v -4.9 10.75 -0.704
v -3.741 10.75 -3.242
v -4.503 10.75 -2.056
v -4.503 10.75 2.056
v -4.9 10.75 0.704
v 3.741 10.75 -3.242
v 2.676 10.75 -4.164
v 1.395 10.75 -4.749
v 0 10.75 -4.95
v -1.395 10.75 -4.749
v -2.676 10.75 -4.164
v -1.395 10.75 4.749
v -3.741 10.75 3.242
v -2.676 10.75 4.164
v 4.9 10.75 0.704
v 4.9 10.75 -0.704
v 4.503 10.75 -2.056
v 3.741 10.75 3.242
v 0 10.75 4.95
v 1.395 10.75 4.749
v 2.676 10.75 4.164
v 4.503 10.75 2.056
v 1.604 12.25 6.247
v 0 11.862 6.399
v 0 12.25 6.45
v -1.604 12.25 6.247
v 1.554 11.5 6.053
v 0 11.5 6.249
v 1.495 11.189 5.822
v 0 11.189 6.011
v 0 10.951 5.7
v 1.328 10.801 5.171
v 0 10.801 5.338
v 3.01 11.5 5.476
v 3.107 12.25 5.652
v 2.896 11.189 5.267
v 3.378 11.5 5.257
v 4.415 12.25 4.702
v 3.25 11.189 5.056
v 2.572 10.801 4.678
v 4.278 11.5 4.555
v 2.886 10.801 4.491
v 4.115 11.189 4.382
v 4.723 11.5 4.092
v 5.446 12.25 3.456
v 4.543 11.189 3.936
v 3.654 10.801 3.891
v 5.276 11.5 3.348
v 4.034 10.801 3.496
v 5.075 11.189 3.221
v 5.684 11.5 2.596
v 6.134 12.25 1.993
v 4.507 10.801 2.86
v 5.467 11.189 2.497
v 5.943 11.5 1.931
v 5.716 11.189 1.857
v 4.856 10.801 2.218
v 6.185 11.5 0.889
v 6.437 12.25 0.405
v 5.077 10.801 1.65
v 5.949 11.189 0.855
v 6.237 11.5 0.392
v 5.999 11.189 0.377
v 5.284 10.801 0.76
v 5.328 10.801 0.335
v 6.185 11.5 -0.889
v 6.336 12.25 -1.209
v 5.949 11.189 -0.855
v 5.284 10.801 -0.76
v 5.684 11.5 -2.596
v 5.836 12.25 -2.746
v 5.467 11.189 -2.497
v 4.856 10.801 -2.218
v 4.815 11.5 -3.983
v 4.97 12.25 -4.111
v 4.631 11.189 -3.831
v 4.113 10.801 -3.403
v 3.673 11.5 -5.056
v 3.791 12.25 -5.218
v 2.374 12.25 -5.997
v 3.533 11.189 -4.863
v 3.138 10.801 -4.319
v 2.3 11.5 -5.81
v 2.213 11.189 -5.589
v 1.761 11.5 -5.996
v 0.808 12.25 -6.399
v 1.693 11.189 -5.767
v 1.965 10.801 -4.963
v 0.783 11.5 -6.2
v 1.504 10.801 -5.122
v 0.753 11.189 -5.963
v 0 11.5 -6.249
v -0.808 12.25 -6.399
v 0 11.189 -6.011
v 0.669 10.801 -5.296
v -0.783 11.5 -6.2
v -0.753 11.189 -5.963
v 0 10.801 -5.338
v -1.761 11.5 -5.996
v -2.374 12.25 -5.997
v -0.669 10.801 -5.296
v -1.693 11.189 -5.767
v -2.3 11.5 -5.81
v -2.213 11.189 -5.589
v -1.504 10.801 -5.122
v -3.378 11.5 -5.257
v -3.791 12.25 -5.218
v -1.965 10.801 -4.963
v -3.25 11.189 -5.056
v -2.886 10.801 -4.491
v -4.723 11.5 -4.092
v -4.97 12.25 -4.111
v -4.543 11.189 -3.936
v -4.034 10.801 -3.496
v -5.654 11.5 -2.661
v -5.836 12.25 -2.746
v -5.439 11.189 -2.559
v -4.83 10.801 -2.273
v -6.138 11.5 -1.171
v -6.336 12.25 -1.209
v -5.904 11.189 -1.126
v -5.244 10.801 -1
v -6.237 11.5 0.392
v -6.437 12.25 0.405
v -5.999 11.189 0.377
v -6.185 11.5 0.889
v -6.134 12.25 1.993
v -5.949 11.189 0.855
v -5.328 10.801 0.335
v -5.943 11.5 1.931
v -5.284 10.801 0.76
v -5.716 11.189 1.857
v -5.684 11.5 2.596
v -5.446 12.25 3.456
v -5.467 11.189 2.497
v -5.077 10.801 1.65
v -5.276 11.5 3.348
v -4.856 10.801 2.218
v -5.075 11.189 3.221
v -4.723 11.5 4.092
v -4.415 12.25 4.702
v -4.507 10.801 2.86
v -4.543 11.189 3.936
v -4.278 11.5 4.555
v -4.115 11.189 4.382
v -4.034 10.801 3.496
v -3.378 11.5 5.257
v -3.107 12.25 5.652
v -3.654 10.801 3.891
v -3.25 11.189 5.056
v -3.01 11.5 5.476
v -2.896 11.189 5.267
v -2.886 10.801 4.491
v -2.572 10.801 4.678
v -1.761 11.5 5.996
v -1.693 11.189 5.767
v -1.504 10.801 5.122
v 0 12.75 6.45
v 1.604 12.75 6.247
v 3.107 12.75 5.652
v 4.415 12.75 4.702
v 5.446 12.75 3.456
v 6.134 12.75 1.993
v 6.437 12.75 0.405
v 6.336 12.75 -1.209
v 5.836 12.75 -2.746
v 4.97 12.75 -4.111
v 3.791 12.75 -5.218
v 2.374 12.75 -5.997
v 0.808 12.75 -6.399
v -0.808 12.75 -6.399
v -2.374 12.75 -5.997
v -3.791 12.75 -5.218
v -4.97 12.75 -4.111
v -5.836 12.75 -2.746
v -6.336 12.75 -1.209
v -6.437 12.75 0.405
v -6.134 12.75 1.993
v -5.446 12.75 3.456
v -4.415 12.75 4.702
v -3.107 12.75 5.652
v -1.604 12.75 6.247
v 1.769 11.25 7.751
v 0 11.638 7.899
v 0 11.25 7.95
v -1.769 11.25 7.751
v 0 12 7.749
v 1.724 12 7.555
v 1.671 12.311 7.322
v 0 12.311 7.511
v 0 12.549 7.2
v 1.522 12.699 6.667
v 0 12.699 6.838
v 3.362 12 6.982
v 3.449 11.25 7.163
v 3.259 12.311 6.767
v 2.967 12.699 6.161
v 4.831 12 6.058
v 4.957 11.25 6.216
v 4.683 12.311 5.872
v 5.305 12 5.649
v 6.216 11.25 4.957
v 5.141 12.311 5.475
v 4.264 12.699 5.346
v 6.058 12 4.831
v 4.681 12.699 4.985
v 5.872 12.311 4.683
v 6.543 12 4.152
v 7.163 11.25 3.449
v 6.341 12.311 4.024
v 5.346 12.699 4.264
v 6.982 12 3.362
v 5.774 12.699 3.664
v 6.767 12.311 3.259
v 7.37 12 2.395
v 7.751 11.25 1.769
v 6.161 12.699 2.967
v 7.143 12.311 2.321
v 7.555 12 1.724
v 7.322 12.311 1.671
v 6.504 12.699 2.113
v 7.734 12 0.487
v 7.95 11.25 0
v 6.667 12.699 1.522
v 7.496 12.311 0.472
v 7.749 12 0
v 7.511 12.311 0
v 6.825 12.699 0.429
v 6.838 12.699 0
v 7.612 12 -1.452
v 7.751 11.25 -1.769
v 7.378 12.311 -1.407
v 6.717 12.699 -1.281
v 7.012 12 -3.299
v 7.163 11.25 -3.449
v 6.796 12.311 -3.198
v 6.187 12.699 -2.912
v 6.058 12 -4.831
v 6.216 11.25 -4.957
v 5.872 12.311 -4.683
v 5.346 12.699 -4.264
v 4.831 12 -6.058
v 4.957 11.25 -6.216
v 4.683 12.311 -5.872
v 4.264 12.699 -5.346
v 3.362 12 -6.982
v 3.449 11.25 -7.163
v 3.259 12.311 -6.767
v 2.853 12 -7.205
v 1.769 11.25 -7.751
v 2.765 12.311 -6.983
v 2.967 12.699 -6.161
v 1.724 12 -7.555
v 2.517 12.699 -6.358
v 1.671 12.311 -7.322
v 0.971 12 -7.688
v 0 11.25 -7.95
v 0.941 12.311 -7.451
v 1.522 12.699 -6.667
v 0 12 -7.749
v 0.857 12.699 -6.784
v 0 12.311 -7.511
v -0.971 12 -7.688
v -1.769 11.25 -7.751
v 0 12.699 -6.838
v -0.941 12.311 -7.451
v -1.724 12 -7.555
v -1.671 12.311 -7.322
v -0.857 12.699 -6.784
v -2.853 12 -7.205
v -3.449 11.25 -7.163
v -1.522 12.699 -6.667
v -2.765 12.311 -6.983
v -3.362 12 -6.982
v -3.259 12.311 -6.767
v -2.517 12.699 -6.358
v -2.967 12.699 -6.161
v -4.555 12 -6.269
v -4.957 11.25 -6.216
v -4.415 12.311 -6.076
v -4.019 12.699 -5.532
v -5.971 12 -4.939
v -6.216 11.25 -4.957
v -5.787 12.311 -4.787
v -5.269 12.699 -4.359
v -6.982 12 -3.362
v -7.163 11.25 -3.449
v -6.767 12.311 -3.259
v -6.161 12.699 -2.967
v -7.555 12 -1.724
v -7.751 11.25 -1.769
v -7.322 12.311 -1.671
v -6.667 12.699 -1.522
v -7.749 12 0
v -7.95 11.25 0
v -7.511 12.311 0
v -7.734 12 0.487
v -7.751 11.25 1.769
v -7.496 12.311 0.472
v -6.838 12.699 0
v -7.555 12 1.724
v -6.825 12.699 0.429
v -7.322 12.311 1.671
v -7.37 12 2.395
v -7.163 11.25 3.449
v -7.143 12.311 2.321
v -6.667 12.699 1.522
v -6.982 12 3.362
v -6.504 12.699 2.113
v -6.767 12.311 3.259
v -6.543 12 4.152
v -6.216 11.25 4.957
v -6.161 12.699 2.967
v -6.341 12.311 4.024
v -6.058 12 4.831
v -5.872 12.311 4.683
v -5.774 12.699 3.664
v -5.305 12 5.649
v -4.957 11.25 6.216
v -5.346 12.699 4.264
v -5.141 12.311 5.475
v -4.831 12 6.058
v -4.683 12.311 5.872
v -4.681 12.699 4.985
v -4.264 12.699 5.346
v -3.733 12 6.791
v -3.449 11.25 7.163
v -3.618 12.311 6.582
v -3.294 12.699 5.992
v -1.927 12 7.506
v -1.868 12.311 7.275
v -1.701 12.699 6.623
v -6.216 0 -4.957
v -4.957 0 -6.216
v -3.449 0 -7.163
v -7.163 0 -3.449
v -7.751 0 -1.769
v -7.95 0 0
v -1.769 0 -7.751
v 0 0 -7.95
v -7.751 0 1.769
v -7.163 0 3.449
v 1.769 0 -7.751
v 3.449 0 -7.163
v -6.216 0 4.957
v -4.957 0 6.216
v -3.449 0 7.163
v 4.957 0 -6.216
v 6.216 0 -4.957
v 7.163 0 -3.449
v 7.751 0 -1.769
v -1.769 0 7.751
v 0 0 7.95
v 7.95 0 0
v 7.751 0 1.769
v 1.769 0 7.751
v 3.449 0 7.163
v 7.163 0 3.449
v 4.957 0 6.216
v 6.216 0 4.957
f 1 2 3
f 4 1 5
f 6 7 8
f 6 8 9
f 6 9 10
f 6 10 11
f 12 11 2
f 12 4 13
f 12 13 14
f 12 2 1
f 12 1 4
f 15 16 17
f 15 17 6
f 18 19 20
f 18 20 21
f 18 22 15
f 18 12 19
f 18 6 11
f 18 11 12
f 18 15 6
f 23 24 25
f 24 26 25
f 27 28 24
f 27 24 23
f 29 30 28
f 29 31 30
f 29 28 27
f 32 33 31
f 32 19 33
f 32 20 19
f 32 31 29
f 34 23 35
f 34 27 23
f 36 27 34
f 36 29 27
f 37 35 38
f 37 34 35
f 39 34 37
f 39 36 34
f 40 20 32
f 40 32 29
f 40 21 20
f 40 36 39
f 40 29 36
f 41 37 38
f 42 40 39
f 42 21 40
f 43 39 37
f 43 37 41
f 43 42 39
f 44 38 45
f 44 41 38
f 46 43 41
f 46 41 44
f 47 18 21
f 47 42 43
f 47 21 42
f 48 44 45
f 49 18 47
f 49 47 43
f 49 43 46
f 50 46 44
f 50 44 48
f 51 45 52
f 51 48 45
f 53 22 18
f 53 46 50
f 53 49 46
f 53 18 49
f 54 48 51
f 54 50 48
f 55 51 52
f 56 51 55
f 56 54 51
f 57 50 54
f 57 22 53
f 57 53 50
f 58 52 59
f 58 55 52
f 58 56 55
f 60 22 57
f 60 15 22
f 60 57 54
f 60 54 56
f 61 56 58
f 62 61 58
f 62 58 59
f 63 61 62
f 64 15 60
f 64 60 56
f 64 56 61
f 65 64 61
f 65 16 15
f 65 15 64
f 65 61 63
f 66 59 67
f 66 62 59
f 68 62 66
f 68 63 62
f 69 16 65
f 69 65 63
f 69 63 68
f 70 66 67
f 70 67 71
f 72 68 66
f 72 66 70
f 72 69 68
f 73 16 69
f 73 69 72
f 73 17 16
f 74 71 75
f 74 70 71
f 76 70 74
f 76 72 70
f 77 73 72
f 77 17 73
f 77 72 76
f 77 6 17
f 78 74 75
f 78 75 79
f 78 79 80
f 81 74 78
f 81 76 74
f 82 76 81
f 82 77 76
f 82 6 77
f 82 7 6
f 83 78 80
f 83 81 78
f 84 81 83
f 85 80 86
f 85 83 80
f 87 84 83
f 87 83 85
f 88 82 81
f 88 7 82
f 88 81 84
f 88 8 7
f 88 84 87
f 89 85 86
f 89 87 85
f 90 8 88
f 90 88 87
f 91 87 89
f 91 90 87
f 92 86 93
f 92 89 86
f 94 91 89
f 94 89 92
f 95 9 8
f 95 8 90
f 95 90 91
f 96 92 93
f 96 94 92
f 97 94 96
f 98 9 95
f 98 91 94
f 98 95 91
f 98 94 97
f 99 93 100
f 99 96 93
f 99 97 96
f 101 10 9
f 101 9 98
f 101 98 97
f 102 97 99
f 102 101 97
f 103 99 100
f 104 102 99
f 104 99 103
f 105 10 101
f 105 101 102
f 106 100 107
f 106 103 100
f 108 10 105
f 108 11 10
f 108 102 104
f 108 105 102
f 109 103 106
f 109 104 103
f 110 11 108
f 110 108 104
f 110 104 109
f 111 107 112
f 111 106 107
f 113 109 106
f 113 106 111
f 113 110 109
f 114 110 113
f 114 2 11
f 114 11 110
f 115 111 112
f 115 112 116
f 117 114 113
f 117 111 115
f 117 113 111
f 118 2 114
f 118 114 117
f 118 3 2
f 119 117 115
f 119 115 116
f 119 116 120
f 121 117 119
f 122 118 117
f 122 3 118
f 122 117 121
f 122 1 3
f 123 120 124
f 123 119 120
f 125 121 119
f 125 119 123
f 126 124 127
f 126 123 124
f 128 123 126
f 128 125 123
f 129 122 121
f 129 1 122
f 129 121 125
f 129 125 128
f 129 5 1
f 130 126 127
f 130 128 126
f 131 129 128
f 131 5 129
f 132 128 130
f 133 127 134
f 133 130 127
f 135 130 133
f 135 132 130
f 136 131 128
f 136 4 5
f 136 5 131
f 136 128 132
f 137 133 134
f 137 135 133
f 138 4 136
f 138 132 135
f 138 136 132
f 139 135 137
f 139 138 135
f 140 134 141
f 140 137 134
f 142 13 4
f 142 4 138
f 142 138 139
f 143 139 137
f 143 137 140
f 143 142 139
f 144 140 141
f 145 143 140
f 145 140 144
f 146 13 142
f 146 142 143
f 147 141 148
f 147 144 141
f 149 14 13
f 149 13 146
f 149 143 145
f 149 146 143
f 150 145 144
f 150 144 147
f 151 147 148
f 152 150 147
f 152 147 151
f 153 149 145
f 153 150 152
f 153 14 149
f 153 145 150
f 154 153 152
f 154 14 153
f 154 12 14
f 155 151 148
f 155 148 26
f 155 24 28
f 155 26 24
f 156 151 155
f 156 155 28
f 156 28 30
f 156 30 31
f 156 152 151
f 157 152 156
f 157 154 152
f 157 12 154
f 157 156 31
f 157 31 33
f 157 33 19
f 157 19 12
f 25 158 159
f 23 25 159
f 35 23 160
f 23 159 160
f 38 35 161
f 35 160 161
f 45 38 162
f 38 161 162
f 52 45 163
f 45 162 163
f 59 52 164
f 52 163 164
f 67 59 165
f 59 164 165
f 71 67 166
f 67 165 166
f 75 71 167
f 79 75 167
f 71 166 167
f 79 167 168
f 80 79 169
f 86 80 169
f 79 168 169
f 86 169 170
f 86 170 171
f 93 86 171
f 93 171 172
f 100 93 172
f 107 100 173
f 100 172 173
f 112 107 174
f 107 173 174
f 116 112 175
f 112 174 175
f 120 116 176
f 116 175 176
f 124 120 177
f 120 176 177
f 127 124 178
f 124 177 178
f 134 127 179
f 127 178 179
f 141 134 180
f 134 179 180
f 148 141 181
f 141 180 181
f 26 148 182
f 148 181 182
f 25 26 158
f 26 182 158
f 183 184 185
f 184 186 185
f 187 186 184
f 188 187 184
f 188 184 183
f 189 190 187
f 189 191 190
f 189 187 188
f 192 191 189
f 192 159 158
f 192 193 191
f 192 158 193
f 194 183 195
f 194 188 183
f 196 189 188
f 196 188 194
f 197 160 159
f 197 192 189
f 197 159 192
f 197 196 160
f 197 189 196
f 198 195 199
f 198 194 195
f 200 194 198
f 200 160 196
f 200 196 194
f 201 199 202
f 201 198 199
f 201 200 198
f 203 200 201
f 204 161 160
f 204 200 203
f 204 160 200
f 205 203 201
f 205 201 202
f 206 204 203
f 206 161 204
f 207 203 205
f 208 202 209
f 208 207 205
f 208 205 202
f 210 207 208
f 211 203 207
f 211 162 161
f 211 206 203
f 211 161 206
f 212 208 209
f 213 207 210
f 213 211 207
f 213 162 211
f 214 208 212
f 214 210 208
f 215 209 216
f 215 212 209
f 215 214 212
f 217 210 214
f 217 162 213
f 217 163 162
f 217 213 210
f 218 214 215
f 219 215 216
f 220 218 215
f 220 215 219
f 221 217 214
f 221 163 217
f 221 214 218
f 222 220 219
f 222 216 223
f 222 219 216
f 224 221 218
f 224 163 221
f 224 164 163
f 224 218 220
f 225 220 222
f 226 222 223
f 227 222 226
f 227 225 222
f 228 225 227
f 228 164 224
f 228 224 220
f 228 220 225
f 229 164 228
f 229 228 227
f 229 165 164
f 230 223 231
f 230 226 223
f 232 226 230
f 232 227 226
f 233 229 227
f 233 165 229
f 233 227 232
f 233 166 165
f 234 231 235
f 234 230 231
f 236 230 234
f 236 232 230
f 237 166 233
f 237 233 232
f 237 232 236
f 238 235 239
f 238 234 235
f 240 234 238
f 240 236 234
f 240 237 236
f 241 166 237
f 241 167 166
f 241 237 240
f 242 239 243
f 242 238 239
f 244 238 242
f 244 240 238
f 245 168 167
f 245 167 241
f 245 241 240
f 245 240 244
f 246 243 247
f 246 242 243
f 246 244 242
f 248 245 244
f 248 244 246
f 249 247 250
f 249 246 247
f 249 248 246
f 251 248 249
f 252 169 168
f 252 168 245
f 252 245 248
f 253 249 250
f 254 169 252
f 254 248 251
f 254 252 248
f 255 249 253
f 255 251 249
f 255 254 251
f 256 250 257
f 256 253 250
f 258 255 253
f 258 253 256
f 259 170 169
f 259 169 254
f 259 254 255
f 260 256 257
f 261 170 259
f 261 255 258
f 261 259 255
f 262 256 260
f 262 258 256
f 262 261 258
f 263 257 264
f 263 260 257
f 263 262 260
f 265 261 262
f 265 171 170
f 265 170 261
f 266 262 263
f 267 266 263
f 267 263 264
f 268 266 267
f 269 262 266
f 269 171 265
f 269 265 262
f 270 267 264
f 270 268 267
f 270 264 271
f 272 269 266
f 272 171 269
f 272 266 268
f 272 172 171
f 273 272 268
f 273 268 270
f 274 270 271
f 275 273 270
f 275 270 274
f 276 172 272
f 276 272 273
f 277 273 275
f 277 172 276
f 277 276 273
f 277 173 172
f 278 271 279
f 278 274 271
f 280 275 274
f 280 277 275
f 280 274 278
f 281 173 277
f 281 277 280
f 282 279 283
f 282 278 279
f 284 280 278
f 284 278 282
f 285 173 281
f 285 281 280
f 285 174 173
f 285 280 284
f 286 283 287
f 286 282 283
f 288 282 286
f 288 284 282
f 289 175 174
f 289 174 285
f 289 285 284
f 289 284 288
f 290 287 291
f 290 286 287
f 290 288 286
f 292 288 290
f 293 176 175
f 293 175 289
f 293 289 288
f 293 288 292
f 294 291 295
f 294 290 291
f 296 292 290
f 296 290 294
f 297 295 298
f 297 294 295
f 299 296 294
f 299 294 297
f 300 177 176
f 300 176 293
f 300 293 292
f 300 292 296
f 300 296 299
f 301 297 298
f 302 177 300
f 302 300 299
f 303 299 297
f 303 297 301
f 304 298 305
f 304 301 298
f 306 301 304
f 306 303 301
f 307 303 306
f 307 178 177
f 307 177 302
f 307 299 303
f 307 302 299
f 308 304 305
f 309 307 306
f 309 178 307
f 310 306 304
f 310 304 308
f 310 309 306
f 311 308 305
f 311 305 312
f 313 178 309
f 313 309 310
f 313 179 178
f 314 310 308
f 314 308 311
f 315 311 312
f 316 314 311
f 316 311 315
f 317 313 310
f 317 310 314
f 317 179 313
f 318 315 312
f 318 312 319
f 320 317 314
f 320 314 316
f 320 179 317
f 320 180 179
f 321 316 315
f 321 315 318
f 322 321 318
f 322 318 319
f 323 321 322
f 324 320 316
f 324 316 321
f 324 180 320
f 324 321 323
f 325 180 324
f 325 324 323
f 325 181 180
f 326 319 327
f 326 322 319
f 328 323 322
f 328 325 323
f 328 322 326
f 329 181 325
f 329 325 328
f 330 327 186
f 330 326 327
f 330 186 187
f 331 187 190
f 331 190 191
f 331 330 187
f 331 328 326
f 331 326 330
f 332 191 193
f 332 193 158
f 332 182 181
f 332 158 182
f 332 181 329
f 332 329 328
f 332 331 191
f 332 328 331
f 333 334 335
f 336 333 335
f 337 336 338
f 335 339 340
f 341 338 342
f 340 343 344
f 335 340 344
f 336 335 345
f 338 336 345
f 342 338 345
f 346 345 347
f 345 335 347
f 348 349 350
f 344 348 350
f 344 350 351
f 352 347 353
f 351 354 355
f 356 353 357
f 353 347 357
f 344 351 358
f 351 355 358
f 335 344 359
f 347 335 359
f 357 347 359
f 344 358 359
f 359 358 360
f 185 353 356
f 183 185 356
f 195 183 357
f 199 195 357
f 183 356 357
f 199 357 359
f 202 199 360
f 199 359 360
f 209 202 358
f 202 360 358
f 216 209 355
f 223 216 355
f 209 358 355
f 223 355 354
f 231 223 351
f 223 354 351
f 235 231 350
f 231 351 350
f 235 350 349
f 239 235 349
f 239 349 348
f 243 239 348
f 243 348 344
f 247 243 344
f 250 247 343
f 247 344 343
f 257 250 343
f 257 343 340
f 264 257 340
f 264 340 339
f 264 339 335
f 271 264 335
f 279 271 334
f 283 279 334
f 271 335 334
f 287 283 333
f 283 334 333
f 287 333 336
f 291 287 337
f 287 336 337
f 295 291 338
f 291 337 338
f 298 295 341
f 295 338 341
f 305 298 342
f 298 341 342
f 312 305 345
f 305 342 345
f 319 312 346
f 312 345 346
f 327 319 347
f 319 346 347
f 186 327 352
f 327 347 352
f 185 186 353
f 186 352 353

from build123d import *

# Parameters (mm, degrees)
SKETCH1_R           = 7.95
BOSS_EXTRUDE1_DEPTH = 12.75
FILLET1_R           = 1.5
SKETCH2_R           = 6.45
CUT_EXTRUDE1_DEPTH  = 2
FILLET2_R           = 1.5


with BuildPart() as part:
    # Sketch1 → Boss-Extrude1 (new body)
    with BuildSketch(Plane(origin=(0, 0, 0), x_dir=(1, 0, 0), z_dir=(0, 1, 0))):
        with Locations(Location((0, 0, 0), (0, 0, 270))):
            Circle(SKETCH1_R)
    extrude(amount=BOSS_EXTRUDE1_DEPTH)

    # Fillet1
    fillet1_edges = [part.edges().sort_by_distance(p)[0] for p in [
        (0, 12.75, -7.95),
    ]]
    fillet(fillet1_edges, radius=FILLET1_R)

    # Sketch2 → Cut-Extrude1 (cut)
    with BuildSketch(Plane(origin=(0, 12.75, 0), x_dir=(1, 0, 0), z_dir=(0, 1, 0))):
        with Locations(Location((0, 0, 0), (0, 0, 270))):
            Circle(SKETCH2_R)
    extrude(amount=-CUT_EXTRUDE1_DEPTH, mode=Mode.SUBTRACT)

    # Fillet2
    fillet2_edges = [part.edges().sort_by_distance(p)[0] for p in [
        (0, 10.75, -6.45),
    ]]
    fillet(fillet2_edges, radius=FILLET2_R)


solid = part.part
